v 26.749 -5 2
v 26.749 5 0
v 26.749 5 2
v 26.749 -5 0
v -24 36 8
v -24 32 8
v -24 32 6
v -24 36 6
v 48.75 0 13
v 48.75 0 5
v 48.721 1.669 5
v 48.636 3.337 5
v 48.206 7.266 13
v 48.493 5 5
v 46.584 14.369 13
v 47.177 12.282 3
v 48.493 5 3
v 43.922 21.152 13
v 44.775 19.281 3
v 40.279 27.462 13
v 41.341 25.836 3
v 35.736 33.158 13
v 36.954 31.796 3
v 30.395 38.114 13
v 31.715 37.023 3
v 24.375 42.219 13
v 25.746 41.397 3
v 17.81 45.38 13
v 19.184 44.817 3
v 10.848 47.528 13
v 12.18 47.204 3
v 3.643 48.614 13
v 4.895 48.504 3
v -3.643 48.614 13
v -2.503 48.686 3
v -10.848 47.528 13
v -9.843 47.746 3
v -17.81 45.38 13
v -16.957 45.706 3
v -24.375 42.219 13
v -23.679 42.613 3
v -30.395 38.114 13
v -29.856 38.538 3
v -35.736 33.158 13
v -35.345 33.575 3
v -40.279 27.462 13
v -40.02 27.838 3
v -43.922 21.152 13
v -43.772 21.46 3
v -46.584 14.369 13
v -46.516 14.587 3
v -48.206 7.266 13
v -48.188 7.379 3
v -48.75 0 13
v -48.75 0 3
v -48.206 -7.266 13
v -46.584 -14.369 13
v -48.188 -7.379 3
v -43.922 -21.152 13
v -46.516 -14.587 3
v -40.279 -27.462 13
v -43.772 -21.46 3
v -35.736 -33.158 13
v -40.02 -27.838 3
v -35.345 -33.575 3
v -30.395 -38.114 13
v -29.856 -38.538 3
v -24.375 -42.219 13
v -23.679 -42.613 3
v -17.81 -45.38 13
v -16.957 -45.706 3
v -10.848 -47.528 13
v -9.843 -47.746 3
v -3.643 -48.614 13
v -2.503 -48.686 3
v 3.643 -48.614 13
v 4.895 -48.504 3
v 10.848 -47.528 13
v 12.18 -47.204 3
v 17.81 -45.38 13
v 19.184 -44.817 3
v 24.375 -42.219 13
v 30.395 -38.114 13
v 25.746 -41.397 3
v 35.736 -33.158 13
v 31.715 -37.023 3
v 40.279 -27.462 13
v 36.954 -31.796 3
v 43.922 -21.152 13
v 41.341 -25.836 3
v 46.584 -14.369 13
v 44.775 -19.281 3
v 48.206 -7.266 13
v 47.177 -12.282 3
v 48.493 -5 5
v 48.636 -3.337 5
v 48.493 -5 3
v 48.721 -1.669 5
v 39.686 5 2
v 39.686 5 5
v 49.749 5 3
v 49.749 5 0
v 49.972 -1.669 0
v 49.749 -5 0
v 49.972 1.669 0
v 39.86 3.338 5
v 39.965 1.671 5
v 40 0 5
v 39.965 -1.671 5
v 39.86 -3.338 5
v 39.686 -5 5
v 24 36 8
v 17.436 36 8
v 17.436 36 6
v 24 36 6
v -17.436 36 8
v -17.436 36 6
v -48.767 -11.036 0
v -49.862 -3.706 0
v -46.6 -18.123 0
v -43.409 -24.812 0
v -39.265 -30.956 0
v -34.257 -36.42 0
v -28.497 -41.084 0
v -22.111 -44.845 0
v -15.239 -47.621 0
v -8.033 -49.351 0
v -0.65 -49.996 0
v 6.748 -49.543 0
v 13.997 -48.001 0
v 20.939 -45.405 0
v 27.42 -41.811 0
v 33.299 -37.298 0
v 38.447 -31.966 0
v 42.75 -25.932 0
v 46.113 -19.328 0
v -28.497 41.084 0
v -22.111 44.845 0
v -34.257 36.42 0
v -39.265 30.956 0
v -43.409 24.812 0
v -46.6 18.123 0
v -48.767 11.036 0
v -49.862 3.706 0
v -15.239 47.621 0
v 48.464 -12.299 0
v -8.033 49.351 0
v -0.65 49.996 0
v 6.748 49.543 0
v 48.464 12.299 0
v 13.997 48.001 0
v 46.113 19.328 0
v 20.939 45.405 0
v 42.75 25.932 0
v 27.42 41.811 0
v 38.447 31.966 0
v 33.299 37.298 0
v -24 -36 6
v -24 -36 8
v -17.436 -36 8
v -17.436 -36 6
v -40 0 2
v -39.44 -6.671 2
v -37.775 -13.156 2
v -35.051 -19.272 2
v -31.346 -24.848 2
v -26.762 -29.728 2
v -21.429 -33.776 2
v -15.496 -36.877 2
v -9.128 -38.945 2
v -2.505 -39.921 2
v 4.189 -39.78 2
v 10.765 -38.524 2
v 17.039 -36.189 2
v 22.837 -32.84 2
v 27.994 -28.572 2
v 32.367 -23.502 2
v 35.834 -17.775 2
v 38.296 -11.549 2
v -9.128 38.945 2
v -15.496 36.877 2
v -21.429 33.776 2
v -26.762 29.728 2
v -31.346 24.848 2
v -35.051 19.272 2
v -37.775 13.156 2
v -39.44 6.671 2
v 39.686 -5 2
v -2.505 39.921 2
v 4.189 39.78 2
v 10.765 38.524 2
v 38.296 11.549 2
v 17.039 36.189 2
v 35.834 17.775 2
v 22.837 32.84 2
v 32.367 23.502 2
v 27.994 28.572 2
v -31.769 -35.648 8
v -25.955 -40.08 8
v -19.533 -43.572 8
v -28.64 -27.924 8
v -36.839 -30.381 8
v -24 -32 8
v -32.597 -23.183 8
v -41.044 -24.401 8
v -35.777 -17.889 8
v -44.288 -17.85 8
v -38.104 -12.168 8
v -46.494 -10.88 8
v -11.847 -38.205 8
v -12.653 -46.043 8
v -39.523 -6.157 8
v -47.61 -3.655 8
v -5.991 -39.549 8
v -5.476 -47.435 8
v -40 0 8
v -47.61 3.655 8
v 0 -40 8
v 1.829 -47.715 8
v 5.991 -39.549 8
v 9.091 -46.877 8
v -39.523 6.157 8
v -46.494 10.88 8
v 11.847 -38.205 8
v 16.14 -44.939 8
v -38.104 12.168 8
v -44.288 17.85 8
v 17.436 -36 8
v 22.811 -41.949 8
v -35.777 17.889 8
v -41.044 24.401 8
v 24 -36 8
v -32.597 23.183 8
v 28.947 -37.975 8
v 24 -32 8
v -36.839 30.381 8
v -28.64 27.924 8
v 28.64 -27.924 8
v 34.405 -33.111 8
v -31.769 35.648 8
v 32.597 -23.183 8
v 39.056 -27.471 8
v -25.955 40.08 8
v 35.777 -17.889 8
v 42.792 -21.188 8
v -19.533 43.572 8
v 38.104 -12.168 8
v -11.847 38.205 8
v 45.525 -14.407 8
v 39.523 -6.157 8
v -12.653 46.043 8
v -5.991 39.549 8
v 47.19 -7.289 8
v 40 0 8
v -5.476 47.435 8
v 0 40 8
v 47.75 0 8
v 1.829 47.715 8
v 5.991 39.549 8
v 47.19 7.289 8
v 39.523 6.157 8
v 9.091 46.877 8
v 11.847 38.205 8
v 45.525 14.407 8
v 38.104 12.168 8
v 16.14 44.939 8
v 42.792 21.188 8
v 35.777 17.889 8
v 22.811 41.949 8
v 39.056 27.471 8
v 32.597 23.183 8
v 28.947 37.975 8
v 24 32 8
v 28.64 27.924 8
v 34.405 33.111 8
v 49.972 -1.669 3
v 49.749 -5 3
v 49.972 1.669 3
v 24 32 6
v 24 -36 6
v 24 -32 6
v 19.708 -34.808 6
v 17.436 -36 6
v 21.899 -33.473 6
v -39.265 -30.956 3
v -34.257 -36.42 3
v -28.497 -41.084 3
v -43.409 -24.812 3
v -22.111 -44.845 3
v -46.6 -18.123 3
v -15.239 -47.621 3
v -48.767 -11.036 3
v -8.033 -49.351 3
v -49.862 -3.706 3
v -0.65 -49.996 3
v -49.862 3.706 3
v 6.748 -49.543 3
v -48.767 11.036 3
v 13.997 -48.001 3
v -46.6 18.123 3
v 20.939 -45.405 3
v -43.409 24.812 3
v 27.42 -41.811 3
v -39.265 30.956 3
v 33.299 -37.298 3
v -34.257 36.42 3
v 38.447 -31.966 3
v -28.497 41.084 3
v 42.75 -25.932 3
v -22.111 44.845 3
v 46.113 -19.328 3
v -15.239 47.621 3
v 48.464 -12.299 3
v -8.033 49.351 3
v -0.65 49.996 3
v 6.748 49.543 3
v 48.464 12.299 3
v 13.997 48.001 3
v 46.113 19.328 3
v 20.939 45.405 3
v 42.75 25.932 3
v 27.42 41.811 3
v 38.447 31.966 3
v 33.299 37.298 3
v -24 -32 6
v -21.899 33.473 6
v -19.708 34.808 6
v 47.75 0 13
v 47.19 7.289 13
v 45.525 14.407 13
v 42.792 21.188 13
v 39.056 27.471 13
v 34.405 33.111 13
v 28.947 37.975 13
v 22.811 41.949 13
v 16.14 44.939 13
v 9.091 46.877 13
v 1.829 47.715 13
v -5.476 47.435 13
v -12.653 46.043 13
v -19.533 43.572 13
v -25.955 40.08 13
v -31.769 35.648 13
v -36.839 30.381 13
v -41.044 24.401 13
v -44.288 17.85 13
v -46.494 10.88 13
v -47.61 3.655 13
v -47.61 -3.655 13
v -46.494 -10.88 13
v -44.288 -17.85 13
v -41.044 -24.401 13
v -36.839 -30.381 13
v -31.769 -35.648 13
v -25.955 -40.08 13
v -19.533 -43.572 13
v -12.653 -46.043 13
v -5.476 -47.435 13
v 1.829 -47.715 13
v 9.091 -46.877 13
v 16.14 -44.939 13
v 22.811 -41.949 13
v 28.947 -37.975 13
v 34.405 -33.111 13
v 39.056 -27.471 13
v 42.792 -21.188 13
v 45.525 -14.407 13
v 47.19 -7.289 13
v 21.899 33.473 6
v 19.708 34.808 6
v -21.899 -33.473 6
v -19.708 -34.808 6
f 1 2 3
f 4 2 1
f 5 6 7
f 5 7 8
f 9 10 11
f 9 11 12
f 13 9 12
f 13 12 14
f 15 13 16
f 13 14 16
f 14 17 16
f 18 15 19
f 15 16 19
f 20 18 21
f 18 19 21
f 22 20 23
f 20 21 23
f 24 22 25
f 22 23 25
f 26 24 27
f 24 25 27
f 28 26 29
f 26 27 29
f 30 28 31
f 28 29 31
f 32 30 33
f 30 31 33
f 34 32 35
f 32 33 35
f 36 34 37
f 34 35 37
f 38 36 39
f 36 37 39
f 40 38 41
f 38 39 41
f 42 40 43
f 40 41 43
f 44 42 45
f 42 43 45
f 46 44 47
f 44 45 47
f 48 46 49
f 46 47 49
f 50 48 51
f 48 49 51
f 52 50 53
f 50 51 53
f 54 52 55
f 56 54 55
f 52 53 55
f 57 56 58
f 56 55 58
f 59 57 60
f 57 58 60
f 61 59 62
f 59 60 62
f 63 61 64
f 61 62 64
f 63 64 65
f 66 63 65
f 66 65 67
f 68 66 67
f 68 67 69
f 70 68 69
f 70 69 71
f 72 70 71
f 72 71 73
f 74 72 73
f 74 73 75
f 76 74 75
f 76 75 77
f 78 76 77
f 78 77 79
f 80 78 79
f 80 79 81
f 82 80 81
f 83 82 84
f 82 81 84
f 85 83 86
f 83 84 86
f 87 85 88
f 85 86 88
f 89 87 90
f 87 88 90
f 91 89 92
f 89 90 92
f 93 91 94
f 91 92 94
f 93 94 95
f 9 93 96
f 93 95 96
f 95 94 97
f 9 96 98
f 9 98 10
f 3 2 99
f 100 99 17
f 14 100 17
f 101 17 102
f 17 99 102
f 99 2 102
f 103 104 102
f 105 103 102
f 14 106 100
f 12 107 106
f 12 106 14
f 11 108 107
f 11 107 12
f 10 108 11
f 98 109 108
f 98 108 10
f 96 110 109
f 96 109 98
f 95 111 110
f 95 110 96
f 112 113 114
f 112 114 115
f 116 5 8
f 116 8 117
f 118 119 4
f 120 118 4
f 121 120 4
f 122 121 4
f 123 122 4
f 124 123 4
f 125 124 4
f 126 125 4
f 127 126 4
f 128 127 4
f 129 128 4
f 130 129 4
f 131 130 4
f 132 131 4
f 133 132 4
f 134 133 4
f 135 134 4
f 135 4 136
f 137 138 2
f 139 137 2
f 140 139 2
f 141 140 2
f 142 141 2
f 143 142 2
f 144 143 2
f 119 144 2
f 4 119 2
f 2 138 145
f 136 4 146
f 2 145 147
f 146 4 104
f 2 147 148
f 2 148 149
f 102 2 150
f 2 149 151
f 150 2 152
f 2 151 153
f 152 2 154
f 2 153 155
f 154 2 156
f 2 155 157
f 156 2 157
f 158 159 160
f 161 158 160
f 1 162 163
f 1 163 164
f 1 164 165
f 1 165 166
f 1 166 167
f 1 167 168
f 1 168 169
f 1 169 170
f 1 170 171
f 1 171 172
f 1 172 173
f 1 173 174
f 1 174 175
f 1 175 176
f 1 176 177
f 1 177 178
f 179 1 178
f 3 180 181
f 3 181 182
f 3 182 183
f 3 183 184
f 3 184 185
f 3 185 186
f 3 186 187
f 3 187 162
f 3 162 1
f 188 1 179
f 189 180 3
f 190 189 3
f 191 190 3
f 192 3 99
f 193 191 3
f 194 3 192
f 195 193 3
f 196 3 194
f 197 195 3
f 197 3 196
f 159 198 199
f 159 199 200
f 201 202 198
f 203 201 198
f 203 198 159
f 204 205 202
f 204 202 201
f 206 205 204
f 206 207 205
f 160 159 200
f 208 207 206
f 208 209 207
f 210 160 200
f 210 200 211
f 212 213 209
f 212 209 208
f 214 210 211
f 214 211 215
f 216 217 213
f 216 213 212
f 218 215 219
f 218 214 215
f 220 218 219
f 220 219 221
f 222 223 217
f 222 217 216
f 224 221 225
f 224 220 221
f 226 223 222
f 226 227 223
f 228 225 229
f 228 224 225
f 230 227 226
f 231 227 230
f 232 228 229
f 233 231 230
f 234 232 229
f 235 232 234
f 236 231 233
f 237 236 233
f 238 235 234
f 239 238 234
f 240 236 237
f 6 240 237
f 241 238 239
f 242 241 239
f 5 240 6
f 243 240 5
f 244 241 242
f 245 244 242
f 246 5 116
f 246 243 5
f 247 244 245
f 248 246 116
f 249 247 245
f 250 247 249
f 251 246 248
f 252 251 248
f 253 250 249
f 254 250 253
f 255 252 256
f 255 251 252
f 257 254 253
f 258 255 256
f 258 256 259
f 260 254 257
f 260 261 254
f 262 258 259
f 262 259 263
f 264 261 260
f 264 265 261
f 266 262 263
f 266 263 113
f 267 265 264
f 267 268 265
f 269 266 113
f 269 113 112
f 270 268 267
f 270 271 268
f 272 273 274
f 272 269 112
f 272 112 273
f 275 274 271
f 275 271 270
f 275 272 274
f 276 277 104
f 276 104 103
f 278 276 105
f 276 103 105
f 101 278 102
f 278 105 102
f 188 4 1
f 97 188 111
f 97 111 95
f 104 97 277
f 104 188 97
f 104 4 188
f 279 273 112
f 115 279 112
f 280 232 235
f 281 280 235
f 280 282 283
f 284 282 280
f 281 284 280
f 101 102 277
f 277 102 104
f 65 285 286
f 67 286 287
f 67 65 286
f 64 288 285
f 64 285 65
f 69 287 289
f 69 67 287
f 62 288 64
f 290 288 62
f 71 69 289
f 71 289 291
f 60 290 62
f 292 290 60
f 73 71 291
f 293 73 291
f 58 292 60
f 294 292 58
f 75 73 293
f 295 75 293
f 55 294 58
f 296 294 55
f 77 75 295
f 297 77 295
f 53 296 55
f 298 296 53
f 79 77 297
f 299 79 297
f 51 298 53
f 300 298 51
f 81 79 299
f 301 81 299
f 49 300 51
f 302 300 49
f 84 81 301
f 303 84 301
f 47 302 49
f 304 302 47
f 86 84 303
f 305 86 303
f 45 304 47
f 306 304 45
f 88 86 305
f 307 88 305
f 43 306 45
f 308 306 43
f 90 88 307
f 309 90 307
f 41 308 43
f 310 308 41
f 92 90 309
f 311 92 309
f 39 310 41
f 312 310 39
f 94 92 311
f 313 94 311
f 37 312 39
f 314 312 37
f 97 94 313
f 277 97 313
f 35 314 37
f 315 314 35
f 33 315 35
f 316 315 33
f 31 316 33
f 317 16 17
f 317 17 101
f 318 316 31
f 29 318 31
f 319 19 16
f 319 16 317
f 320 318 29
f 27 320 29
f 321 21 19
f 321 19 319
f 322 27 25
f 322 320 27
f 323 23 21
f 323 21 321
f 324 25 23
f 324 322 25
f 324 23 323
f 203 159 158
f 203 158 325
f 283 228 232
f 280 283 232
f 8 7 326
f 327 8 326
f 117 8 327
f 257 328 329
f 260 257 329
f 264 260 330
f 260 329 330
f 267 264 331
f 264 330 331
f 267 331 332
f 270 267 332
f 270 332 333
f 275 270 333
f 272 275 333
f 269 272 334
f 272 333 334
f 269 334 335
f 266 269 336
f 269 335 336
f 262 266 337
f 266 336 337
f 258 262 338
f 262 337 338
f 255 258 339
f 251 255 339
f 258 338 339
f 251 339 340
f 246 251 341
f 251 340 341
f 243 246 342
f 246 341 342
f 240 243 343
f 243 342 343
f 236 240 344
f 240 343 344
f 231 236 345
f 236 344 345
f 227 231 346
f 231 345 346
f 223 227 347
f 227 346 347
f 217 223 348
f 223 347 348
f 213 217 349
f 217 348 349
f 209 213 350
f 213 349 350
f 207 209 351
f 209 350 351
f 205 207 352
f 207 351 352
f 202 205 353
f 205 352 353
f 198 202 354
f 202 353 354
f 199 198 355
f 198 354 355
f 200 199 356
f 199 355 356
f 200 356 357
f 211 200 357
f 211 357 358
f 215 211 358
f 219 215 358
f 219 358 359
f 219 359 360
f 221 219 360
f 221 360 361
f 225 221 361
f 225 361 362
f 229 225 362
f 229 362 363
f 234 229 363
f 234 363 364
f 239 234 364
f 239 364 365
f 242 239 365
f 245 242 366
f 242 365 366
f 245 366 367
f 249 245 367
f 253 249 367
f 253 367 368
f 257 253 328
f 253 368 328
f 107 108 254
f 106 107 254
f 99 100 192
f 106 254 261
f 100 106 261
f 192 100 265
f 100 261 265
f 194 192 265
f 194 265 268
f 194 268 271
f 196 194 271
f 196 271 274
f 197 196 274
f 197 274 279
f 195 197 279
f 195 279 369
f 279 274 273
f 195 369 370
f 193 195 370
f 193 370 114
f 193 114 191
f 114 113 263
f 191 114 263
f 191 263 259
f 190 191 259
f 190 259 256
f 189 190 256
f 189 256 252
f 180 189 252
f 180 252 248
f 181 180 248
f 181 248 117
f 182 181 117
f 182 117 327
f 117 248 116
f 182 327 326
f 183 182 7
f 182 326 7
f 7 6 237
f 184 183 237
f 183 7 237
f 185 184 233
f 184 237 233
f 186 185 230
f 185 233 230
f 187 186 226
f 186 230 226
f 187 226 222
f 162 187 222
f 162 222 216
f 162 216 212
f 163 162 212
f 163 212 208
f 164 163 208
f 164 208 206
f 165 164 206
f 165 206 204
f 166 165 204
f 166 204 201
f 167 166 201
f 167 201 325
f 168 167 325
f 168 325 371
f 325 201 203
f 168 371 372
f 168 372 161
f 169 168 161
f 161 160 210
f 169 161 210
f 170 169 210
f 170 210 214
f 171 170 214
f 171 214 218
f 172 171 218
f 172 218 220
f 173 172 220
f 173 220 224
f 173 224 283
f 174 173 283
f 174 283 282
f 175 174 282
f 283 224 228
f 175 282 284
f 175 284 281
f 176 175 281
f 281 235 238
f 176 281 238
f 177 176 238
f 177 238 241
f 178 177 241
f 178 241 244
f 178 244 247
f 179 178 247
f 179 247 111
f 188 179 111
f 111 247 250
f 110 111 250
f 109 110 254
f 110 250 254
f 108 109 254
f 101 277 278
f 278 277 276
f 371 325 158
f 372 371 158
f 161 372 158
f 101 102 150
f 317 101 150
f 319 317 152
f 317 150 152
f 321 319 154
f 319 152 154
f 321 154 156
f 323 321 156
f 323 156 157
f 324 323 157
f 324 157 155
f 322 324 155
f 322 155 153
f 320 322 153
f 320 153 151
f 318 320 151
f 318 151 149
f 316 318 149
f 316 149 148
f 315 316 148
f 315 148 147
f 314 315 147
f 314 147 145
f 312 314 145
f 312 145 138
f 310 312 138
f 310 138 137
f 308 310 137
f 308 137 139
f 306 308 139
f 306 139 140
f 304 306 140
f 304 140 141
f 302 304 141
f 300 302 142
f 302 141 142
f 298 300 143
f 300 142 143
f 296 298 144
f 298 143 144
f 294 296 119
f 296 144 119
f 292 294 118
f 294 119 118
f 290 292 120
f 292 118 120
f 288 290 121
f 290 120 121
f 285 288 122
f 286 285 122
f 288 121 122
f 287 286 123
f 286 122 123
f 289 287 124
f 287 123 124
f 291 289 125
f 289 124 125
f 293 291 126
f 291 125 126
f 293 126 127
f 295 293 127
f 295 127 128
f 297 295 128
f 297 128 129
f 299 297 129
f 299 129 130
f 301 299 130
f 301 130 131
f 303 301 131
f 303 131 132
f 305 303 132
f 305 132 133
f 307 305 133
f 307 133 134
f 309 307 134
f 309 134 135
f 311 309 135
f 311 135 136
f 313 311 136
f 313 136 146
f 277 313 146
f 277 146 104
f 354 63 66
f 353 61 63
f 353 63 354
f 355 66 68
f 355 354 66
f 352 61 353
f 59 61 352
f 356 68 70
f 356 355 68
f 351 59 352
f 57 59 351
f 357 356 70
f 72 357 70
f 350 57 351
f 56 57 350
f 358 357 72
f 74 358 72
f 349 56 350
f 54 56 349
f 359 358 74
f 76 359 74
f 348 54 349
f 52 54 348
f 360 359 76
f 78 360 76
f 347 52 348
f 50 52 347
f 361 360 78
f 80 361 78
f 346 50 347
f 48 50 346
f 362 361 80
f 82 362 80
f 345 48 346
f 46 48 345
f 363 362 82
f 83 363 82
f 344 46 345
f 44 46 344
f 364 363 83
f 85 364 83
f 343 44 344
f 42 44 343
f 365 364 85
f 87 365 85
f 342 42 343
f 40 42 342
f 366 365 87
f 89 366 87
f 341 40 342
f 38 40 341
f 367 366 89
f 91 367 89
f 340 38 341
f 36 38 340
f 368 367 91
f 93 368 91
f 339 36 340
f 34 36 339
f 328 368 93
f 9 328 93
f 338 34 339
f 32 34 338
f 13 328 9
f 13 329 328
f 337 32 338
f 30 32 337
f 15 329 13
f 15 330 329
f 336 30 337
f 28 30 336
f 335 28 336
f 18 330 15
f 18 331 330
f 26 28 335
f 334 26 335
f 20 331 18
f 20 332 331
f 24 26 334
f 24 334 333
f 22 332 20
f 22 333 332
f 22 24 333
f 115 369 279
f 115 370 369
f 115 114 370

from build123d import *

# Parameters (mm, degrees)
F0_R      = 50
F1_DEPTH  = 3
F2_R      = 48.75
F3_DEPTH  = 10
F4_R      = 47.75
F5_DEPTH  = 5
F6_R      = 40
F7_DEPTH  = 6
F8_W      = 48
F8_H      = 72
F9_DEPTH  = 2
F10_W     = 23
F10_H     = 10
F11_DEPTH = 5


with BuildPart() as f1:
    # F0 (on Top) → F1 (new body)
    with BuildSketch(Plane.XY):
        Circle(F0_R)
    extrude(amount=F1_DEPTH)

    # F2 (on face) → F3 (join)
    with BuildSketch(Plane.XY.offset(3)):
        Circle(F2_R)
    extrude(amount=F3_DEPTH)

    # F4 (on face) → F5 (cut)
    with BuildSketch(Plane.XY.offset(13)):
        Circle(F4_R)
    extrude(amount=-F5_DEPTH, mode=Mode.SUBTRACT)

    # F6 (on face) → F7 (cut)
    with BuildSketch(Plane.XY.offset(8)):
        Circle(F6_R)
    extrude(amount=-F7_DEPTH, mode=Mode.SUBTRACT)

    # F8 (on face) → F9 (cut)
    with BuildSketch(Plane.XY.offset(8)):
        Rectangle(F8_W, F8_H)
    extrude(amount=-F9_DEPTH, mode=Mode.SUBTRACT)

    # F10 (on face) → F11 (cut)
    with BuildSketch(Plane(origin=(0, 0, 0), x_dir=(1, 0, 0), z_dir=(0, 0, -1))):
        with Locations((38.249372, 0)):
            Rectangle(F10_W, F10_H)
    extrude(amount=-F11_DEPTH, mode=Mode.SUBTRACT)


solid = f1.part
